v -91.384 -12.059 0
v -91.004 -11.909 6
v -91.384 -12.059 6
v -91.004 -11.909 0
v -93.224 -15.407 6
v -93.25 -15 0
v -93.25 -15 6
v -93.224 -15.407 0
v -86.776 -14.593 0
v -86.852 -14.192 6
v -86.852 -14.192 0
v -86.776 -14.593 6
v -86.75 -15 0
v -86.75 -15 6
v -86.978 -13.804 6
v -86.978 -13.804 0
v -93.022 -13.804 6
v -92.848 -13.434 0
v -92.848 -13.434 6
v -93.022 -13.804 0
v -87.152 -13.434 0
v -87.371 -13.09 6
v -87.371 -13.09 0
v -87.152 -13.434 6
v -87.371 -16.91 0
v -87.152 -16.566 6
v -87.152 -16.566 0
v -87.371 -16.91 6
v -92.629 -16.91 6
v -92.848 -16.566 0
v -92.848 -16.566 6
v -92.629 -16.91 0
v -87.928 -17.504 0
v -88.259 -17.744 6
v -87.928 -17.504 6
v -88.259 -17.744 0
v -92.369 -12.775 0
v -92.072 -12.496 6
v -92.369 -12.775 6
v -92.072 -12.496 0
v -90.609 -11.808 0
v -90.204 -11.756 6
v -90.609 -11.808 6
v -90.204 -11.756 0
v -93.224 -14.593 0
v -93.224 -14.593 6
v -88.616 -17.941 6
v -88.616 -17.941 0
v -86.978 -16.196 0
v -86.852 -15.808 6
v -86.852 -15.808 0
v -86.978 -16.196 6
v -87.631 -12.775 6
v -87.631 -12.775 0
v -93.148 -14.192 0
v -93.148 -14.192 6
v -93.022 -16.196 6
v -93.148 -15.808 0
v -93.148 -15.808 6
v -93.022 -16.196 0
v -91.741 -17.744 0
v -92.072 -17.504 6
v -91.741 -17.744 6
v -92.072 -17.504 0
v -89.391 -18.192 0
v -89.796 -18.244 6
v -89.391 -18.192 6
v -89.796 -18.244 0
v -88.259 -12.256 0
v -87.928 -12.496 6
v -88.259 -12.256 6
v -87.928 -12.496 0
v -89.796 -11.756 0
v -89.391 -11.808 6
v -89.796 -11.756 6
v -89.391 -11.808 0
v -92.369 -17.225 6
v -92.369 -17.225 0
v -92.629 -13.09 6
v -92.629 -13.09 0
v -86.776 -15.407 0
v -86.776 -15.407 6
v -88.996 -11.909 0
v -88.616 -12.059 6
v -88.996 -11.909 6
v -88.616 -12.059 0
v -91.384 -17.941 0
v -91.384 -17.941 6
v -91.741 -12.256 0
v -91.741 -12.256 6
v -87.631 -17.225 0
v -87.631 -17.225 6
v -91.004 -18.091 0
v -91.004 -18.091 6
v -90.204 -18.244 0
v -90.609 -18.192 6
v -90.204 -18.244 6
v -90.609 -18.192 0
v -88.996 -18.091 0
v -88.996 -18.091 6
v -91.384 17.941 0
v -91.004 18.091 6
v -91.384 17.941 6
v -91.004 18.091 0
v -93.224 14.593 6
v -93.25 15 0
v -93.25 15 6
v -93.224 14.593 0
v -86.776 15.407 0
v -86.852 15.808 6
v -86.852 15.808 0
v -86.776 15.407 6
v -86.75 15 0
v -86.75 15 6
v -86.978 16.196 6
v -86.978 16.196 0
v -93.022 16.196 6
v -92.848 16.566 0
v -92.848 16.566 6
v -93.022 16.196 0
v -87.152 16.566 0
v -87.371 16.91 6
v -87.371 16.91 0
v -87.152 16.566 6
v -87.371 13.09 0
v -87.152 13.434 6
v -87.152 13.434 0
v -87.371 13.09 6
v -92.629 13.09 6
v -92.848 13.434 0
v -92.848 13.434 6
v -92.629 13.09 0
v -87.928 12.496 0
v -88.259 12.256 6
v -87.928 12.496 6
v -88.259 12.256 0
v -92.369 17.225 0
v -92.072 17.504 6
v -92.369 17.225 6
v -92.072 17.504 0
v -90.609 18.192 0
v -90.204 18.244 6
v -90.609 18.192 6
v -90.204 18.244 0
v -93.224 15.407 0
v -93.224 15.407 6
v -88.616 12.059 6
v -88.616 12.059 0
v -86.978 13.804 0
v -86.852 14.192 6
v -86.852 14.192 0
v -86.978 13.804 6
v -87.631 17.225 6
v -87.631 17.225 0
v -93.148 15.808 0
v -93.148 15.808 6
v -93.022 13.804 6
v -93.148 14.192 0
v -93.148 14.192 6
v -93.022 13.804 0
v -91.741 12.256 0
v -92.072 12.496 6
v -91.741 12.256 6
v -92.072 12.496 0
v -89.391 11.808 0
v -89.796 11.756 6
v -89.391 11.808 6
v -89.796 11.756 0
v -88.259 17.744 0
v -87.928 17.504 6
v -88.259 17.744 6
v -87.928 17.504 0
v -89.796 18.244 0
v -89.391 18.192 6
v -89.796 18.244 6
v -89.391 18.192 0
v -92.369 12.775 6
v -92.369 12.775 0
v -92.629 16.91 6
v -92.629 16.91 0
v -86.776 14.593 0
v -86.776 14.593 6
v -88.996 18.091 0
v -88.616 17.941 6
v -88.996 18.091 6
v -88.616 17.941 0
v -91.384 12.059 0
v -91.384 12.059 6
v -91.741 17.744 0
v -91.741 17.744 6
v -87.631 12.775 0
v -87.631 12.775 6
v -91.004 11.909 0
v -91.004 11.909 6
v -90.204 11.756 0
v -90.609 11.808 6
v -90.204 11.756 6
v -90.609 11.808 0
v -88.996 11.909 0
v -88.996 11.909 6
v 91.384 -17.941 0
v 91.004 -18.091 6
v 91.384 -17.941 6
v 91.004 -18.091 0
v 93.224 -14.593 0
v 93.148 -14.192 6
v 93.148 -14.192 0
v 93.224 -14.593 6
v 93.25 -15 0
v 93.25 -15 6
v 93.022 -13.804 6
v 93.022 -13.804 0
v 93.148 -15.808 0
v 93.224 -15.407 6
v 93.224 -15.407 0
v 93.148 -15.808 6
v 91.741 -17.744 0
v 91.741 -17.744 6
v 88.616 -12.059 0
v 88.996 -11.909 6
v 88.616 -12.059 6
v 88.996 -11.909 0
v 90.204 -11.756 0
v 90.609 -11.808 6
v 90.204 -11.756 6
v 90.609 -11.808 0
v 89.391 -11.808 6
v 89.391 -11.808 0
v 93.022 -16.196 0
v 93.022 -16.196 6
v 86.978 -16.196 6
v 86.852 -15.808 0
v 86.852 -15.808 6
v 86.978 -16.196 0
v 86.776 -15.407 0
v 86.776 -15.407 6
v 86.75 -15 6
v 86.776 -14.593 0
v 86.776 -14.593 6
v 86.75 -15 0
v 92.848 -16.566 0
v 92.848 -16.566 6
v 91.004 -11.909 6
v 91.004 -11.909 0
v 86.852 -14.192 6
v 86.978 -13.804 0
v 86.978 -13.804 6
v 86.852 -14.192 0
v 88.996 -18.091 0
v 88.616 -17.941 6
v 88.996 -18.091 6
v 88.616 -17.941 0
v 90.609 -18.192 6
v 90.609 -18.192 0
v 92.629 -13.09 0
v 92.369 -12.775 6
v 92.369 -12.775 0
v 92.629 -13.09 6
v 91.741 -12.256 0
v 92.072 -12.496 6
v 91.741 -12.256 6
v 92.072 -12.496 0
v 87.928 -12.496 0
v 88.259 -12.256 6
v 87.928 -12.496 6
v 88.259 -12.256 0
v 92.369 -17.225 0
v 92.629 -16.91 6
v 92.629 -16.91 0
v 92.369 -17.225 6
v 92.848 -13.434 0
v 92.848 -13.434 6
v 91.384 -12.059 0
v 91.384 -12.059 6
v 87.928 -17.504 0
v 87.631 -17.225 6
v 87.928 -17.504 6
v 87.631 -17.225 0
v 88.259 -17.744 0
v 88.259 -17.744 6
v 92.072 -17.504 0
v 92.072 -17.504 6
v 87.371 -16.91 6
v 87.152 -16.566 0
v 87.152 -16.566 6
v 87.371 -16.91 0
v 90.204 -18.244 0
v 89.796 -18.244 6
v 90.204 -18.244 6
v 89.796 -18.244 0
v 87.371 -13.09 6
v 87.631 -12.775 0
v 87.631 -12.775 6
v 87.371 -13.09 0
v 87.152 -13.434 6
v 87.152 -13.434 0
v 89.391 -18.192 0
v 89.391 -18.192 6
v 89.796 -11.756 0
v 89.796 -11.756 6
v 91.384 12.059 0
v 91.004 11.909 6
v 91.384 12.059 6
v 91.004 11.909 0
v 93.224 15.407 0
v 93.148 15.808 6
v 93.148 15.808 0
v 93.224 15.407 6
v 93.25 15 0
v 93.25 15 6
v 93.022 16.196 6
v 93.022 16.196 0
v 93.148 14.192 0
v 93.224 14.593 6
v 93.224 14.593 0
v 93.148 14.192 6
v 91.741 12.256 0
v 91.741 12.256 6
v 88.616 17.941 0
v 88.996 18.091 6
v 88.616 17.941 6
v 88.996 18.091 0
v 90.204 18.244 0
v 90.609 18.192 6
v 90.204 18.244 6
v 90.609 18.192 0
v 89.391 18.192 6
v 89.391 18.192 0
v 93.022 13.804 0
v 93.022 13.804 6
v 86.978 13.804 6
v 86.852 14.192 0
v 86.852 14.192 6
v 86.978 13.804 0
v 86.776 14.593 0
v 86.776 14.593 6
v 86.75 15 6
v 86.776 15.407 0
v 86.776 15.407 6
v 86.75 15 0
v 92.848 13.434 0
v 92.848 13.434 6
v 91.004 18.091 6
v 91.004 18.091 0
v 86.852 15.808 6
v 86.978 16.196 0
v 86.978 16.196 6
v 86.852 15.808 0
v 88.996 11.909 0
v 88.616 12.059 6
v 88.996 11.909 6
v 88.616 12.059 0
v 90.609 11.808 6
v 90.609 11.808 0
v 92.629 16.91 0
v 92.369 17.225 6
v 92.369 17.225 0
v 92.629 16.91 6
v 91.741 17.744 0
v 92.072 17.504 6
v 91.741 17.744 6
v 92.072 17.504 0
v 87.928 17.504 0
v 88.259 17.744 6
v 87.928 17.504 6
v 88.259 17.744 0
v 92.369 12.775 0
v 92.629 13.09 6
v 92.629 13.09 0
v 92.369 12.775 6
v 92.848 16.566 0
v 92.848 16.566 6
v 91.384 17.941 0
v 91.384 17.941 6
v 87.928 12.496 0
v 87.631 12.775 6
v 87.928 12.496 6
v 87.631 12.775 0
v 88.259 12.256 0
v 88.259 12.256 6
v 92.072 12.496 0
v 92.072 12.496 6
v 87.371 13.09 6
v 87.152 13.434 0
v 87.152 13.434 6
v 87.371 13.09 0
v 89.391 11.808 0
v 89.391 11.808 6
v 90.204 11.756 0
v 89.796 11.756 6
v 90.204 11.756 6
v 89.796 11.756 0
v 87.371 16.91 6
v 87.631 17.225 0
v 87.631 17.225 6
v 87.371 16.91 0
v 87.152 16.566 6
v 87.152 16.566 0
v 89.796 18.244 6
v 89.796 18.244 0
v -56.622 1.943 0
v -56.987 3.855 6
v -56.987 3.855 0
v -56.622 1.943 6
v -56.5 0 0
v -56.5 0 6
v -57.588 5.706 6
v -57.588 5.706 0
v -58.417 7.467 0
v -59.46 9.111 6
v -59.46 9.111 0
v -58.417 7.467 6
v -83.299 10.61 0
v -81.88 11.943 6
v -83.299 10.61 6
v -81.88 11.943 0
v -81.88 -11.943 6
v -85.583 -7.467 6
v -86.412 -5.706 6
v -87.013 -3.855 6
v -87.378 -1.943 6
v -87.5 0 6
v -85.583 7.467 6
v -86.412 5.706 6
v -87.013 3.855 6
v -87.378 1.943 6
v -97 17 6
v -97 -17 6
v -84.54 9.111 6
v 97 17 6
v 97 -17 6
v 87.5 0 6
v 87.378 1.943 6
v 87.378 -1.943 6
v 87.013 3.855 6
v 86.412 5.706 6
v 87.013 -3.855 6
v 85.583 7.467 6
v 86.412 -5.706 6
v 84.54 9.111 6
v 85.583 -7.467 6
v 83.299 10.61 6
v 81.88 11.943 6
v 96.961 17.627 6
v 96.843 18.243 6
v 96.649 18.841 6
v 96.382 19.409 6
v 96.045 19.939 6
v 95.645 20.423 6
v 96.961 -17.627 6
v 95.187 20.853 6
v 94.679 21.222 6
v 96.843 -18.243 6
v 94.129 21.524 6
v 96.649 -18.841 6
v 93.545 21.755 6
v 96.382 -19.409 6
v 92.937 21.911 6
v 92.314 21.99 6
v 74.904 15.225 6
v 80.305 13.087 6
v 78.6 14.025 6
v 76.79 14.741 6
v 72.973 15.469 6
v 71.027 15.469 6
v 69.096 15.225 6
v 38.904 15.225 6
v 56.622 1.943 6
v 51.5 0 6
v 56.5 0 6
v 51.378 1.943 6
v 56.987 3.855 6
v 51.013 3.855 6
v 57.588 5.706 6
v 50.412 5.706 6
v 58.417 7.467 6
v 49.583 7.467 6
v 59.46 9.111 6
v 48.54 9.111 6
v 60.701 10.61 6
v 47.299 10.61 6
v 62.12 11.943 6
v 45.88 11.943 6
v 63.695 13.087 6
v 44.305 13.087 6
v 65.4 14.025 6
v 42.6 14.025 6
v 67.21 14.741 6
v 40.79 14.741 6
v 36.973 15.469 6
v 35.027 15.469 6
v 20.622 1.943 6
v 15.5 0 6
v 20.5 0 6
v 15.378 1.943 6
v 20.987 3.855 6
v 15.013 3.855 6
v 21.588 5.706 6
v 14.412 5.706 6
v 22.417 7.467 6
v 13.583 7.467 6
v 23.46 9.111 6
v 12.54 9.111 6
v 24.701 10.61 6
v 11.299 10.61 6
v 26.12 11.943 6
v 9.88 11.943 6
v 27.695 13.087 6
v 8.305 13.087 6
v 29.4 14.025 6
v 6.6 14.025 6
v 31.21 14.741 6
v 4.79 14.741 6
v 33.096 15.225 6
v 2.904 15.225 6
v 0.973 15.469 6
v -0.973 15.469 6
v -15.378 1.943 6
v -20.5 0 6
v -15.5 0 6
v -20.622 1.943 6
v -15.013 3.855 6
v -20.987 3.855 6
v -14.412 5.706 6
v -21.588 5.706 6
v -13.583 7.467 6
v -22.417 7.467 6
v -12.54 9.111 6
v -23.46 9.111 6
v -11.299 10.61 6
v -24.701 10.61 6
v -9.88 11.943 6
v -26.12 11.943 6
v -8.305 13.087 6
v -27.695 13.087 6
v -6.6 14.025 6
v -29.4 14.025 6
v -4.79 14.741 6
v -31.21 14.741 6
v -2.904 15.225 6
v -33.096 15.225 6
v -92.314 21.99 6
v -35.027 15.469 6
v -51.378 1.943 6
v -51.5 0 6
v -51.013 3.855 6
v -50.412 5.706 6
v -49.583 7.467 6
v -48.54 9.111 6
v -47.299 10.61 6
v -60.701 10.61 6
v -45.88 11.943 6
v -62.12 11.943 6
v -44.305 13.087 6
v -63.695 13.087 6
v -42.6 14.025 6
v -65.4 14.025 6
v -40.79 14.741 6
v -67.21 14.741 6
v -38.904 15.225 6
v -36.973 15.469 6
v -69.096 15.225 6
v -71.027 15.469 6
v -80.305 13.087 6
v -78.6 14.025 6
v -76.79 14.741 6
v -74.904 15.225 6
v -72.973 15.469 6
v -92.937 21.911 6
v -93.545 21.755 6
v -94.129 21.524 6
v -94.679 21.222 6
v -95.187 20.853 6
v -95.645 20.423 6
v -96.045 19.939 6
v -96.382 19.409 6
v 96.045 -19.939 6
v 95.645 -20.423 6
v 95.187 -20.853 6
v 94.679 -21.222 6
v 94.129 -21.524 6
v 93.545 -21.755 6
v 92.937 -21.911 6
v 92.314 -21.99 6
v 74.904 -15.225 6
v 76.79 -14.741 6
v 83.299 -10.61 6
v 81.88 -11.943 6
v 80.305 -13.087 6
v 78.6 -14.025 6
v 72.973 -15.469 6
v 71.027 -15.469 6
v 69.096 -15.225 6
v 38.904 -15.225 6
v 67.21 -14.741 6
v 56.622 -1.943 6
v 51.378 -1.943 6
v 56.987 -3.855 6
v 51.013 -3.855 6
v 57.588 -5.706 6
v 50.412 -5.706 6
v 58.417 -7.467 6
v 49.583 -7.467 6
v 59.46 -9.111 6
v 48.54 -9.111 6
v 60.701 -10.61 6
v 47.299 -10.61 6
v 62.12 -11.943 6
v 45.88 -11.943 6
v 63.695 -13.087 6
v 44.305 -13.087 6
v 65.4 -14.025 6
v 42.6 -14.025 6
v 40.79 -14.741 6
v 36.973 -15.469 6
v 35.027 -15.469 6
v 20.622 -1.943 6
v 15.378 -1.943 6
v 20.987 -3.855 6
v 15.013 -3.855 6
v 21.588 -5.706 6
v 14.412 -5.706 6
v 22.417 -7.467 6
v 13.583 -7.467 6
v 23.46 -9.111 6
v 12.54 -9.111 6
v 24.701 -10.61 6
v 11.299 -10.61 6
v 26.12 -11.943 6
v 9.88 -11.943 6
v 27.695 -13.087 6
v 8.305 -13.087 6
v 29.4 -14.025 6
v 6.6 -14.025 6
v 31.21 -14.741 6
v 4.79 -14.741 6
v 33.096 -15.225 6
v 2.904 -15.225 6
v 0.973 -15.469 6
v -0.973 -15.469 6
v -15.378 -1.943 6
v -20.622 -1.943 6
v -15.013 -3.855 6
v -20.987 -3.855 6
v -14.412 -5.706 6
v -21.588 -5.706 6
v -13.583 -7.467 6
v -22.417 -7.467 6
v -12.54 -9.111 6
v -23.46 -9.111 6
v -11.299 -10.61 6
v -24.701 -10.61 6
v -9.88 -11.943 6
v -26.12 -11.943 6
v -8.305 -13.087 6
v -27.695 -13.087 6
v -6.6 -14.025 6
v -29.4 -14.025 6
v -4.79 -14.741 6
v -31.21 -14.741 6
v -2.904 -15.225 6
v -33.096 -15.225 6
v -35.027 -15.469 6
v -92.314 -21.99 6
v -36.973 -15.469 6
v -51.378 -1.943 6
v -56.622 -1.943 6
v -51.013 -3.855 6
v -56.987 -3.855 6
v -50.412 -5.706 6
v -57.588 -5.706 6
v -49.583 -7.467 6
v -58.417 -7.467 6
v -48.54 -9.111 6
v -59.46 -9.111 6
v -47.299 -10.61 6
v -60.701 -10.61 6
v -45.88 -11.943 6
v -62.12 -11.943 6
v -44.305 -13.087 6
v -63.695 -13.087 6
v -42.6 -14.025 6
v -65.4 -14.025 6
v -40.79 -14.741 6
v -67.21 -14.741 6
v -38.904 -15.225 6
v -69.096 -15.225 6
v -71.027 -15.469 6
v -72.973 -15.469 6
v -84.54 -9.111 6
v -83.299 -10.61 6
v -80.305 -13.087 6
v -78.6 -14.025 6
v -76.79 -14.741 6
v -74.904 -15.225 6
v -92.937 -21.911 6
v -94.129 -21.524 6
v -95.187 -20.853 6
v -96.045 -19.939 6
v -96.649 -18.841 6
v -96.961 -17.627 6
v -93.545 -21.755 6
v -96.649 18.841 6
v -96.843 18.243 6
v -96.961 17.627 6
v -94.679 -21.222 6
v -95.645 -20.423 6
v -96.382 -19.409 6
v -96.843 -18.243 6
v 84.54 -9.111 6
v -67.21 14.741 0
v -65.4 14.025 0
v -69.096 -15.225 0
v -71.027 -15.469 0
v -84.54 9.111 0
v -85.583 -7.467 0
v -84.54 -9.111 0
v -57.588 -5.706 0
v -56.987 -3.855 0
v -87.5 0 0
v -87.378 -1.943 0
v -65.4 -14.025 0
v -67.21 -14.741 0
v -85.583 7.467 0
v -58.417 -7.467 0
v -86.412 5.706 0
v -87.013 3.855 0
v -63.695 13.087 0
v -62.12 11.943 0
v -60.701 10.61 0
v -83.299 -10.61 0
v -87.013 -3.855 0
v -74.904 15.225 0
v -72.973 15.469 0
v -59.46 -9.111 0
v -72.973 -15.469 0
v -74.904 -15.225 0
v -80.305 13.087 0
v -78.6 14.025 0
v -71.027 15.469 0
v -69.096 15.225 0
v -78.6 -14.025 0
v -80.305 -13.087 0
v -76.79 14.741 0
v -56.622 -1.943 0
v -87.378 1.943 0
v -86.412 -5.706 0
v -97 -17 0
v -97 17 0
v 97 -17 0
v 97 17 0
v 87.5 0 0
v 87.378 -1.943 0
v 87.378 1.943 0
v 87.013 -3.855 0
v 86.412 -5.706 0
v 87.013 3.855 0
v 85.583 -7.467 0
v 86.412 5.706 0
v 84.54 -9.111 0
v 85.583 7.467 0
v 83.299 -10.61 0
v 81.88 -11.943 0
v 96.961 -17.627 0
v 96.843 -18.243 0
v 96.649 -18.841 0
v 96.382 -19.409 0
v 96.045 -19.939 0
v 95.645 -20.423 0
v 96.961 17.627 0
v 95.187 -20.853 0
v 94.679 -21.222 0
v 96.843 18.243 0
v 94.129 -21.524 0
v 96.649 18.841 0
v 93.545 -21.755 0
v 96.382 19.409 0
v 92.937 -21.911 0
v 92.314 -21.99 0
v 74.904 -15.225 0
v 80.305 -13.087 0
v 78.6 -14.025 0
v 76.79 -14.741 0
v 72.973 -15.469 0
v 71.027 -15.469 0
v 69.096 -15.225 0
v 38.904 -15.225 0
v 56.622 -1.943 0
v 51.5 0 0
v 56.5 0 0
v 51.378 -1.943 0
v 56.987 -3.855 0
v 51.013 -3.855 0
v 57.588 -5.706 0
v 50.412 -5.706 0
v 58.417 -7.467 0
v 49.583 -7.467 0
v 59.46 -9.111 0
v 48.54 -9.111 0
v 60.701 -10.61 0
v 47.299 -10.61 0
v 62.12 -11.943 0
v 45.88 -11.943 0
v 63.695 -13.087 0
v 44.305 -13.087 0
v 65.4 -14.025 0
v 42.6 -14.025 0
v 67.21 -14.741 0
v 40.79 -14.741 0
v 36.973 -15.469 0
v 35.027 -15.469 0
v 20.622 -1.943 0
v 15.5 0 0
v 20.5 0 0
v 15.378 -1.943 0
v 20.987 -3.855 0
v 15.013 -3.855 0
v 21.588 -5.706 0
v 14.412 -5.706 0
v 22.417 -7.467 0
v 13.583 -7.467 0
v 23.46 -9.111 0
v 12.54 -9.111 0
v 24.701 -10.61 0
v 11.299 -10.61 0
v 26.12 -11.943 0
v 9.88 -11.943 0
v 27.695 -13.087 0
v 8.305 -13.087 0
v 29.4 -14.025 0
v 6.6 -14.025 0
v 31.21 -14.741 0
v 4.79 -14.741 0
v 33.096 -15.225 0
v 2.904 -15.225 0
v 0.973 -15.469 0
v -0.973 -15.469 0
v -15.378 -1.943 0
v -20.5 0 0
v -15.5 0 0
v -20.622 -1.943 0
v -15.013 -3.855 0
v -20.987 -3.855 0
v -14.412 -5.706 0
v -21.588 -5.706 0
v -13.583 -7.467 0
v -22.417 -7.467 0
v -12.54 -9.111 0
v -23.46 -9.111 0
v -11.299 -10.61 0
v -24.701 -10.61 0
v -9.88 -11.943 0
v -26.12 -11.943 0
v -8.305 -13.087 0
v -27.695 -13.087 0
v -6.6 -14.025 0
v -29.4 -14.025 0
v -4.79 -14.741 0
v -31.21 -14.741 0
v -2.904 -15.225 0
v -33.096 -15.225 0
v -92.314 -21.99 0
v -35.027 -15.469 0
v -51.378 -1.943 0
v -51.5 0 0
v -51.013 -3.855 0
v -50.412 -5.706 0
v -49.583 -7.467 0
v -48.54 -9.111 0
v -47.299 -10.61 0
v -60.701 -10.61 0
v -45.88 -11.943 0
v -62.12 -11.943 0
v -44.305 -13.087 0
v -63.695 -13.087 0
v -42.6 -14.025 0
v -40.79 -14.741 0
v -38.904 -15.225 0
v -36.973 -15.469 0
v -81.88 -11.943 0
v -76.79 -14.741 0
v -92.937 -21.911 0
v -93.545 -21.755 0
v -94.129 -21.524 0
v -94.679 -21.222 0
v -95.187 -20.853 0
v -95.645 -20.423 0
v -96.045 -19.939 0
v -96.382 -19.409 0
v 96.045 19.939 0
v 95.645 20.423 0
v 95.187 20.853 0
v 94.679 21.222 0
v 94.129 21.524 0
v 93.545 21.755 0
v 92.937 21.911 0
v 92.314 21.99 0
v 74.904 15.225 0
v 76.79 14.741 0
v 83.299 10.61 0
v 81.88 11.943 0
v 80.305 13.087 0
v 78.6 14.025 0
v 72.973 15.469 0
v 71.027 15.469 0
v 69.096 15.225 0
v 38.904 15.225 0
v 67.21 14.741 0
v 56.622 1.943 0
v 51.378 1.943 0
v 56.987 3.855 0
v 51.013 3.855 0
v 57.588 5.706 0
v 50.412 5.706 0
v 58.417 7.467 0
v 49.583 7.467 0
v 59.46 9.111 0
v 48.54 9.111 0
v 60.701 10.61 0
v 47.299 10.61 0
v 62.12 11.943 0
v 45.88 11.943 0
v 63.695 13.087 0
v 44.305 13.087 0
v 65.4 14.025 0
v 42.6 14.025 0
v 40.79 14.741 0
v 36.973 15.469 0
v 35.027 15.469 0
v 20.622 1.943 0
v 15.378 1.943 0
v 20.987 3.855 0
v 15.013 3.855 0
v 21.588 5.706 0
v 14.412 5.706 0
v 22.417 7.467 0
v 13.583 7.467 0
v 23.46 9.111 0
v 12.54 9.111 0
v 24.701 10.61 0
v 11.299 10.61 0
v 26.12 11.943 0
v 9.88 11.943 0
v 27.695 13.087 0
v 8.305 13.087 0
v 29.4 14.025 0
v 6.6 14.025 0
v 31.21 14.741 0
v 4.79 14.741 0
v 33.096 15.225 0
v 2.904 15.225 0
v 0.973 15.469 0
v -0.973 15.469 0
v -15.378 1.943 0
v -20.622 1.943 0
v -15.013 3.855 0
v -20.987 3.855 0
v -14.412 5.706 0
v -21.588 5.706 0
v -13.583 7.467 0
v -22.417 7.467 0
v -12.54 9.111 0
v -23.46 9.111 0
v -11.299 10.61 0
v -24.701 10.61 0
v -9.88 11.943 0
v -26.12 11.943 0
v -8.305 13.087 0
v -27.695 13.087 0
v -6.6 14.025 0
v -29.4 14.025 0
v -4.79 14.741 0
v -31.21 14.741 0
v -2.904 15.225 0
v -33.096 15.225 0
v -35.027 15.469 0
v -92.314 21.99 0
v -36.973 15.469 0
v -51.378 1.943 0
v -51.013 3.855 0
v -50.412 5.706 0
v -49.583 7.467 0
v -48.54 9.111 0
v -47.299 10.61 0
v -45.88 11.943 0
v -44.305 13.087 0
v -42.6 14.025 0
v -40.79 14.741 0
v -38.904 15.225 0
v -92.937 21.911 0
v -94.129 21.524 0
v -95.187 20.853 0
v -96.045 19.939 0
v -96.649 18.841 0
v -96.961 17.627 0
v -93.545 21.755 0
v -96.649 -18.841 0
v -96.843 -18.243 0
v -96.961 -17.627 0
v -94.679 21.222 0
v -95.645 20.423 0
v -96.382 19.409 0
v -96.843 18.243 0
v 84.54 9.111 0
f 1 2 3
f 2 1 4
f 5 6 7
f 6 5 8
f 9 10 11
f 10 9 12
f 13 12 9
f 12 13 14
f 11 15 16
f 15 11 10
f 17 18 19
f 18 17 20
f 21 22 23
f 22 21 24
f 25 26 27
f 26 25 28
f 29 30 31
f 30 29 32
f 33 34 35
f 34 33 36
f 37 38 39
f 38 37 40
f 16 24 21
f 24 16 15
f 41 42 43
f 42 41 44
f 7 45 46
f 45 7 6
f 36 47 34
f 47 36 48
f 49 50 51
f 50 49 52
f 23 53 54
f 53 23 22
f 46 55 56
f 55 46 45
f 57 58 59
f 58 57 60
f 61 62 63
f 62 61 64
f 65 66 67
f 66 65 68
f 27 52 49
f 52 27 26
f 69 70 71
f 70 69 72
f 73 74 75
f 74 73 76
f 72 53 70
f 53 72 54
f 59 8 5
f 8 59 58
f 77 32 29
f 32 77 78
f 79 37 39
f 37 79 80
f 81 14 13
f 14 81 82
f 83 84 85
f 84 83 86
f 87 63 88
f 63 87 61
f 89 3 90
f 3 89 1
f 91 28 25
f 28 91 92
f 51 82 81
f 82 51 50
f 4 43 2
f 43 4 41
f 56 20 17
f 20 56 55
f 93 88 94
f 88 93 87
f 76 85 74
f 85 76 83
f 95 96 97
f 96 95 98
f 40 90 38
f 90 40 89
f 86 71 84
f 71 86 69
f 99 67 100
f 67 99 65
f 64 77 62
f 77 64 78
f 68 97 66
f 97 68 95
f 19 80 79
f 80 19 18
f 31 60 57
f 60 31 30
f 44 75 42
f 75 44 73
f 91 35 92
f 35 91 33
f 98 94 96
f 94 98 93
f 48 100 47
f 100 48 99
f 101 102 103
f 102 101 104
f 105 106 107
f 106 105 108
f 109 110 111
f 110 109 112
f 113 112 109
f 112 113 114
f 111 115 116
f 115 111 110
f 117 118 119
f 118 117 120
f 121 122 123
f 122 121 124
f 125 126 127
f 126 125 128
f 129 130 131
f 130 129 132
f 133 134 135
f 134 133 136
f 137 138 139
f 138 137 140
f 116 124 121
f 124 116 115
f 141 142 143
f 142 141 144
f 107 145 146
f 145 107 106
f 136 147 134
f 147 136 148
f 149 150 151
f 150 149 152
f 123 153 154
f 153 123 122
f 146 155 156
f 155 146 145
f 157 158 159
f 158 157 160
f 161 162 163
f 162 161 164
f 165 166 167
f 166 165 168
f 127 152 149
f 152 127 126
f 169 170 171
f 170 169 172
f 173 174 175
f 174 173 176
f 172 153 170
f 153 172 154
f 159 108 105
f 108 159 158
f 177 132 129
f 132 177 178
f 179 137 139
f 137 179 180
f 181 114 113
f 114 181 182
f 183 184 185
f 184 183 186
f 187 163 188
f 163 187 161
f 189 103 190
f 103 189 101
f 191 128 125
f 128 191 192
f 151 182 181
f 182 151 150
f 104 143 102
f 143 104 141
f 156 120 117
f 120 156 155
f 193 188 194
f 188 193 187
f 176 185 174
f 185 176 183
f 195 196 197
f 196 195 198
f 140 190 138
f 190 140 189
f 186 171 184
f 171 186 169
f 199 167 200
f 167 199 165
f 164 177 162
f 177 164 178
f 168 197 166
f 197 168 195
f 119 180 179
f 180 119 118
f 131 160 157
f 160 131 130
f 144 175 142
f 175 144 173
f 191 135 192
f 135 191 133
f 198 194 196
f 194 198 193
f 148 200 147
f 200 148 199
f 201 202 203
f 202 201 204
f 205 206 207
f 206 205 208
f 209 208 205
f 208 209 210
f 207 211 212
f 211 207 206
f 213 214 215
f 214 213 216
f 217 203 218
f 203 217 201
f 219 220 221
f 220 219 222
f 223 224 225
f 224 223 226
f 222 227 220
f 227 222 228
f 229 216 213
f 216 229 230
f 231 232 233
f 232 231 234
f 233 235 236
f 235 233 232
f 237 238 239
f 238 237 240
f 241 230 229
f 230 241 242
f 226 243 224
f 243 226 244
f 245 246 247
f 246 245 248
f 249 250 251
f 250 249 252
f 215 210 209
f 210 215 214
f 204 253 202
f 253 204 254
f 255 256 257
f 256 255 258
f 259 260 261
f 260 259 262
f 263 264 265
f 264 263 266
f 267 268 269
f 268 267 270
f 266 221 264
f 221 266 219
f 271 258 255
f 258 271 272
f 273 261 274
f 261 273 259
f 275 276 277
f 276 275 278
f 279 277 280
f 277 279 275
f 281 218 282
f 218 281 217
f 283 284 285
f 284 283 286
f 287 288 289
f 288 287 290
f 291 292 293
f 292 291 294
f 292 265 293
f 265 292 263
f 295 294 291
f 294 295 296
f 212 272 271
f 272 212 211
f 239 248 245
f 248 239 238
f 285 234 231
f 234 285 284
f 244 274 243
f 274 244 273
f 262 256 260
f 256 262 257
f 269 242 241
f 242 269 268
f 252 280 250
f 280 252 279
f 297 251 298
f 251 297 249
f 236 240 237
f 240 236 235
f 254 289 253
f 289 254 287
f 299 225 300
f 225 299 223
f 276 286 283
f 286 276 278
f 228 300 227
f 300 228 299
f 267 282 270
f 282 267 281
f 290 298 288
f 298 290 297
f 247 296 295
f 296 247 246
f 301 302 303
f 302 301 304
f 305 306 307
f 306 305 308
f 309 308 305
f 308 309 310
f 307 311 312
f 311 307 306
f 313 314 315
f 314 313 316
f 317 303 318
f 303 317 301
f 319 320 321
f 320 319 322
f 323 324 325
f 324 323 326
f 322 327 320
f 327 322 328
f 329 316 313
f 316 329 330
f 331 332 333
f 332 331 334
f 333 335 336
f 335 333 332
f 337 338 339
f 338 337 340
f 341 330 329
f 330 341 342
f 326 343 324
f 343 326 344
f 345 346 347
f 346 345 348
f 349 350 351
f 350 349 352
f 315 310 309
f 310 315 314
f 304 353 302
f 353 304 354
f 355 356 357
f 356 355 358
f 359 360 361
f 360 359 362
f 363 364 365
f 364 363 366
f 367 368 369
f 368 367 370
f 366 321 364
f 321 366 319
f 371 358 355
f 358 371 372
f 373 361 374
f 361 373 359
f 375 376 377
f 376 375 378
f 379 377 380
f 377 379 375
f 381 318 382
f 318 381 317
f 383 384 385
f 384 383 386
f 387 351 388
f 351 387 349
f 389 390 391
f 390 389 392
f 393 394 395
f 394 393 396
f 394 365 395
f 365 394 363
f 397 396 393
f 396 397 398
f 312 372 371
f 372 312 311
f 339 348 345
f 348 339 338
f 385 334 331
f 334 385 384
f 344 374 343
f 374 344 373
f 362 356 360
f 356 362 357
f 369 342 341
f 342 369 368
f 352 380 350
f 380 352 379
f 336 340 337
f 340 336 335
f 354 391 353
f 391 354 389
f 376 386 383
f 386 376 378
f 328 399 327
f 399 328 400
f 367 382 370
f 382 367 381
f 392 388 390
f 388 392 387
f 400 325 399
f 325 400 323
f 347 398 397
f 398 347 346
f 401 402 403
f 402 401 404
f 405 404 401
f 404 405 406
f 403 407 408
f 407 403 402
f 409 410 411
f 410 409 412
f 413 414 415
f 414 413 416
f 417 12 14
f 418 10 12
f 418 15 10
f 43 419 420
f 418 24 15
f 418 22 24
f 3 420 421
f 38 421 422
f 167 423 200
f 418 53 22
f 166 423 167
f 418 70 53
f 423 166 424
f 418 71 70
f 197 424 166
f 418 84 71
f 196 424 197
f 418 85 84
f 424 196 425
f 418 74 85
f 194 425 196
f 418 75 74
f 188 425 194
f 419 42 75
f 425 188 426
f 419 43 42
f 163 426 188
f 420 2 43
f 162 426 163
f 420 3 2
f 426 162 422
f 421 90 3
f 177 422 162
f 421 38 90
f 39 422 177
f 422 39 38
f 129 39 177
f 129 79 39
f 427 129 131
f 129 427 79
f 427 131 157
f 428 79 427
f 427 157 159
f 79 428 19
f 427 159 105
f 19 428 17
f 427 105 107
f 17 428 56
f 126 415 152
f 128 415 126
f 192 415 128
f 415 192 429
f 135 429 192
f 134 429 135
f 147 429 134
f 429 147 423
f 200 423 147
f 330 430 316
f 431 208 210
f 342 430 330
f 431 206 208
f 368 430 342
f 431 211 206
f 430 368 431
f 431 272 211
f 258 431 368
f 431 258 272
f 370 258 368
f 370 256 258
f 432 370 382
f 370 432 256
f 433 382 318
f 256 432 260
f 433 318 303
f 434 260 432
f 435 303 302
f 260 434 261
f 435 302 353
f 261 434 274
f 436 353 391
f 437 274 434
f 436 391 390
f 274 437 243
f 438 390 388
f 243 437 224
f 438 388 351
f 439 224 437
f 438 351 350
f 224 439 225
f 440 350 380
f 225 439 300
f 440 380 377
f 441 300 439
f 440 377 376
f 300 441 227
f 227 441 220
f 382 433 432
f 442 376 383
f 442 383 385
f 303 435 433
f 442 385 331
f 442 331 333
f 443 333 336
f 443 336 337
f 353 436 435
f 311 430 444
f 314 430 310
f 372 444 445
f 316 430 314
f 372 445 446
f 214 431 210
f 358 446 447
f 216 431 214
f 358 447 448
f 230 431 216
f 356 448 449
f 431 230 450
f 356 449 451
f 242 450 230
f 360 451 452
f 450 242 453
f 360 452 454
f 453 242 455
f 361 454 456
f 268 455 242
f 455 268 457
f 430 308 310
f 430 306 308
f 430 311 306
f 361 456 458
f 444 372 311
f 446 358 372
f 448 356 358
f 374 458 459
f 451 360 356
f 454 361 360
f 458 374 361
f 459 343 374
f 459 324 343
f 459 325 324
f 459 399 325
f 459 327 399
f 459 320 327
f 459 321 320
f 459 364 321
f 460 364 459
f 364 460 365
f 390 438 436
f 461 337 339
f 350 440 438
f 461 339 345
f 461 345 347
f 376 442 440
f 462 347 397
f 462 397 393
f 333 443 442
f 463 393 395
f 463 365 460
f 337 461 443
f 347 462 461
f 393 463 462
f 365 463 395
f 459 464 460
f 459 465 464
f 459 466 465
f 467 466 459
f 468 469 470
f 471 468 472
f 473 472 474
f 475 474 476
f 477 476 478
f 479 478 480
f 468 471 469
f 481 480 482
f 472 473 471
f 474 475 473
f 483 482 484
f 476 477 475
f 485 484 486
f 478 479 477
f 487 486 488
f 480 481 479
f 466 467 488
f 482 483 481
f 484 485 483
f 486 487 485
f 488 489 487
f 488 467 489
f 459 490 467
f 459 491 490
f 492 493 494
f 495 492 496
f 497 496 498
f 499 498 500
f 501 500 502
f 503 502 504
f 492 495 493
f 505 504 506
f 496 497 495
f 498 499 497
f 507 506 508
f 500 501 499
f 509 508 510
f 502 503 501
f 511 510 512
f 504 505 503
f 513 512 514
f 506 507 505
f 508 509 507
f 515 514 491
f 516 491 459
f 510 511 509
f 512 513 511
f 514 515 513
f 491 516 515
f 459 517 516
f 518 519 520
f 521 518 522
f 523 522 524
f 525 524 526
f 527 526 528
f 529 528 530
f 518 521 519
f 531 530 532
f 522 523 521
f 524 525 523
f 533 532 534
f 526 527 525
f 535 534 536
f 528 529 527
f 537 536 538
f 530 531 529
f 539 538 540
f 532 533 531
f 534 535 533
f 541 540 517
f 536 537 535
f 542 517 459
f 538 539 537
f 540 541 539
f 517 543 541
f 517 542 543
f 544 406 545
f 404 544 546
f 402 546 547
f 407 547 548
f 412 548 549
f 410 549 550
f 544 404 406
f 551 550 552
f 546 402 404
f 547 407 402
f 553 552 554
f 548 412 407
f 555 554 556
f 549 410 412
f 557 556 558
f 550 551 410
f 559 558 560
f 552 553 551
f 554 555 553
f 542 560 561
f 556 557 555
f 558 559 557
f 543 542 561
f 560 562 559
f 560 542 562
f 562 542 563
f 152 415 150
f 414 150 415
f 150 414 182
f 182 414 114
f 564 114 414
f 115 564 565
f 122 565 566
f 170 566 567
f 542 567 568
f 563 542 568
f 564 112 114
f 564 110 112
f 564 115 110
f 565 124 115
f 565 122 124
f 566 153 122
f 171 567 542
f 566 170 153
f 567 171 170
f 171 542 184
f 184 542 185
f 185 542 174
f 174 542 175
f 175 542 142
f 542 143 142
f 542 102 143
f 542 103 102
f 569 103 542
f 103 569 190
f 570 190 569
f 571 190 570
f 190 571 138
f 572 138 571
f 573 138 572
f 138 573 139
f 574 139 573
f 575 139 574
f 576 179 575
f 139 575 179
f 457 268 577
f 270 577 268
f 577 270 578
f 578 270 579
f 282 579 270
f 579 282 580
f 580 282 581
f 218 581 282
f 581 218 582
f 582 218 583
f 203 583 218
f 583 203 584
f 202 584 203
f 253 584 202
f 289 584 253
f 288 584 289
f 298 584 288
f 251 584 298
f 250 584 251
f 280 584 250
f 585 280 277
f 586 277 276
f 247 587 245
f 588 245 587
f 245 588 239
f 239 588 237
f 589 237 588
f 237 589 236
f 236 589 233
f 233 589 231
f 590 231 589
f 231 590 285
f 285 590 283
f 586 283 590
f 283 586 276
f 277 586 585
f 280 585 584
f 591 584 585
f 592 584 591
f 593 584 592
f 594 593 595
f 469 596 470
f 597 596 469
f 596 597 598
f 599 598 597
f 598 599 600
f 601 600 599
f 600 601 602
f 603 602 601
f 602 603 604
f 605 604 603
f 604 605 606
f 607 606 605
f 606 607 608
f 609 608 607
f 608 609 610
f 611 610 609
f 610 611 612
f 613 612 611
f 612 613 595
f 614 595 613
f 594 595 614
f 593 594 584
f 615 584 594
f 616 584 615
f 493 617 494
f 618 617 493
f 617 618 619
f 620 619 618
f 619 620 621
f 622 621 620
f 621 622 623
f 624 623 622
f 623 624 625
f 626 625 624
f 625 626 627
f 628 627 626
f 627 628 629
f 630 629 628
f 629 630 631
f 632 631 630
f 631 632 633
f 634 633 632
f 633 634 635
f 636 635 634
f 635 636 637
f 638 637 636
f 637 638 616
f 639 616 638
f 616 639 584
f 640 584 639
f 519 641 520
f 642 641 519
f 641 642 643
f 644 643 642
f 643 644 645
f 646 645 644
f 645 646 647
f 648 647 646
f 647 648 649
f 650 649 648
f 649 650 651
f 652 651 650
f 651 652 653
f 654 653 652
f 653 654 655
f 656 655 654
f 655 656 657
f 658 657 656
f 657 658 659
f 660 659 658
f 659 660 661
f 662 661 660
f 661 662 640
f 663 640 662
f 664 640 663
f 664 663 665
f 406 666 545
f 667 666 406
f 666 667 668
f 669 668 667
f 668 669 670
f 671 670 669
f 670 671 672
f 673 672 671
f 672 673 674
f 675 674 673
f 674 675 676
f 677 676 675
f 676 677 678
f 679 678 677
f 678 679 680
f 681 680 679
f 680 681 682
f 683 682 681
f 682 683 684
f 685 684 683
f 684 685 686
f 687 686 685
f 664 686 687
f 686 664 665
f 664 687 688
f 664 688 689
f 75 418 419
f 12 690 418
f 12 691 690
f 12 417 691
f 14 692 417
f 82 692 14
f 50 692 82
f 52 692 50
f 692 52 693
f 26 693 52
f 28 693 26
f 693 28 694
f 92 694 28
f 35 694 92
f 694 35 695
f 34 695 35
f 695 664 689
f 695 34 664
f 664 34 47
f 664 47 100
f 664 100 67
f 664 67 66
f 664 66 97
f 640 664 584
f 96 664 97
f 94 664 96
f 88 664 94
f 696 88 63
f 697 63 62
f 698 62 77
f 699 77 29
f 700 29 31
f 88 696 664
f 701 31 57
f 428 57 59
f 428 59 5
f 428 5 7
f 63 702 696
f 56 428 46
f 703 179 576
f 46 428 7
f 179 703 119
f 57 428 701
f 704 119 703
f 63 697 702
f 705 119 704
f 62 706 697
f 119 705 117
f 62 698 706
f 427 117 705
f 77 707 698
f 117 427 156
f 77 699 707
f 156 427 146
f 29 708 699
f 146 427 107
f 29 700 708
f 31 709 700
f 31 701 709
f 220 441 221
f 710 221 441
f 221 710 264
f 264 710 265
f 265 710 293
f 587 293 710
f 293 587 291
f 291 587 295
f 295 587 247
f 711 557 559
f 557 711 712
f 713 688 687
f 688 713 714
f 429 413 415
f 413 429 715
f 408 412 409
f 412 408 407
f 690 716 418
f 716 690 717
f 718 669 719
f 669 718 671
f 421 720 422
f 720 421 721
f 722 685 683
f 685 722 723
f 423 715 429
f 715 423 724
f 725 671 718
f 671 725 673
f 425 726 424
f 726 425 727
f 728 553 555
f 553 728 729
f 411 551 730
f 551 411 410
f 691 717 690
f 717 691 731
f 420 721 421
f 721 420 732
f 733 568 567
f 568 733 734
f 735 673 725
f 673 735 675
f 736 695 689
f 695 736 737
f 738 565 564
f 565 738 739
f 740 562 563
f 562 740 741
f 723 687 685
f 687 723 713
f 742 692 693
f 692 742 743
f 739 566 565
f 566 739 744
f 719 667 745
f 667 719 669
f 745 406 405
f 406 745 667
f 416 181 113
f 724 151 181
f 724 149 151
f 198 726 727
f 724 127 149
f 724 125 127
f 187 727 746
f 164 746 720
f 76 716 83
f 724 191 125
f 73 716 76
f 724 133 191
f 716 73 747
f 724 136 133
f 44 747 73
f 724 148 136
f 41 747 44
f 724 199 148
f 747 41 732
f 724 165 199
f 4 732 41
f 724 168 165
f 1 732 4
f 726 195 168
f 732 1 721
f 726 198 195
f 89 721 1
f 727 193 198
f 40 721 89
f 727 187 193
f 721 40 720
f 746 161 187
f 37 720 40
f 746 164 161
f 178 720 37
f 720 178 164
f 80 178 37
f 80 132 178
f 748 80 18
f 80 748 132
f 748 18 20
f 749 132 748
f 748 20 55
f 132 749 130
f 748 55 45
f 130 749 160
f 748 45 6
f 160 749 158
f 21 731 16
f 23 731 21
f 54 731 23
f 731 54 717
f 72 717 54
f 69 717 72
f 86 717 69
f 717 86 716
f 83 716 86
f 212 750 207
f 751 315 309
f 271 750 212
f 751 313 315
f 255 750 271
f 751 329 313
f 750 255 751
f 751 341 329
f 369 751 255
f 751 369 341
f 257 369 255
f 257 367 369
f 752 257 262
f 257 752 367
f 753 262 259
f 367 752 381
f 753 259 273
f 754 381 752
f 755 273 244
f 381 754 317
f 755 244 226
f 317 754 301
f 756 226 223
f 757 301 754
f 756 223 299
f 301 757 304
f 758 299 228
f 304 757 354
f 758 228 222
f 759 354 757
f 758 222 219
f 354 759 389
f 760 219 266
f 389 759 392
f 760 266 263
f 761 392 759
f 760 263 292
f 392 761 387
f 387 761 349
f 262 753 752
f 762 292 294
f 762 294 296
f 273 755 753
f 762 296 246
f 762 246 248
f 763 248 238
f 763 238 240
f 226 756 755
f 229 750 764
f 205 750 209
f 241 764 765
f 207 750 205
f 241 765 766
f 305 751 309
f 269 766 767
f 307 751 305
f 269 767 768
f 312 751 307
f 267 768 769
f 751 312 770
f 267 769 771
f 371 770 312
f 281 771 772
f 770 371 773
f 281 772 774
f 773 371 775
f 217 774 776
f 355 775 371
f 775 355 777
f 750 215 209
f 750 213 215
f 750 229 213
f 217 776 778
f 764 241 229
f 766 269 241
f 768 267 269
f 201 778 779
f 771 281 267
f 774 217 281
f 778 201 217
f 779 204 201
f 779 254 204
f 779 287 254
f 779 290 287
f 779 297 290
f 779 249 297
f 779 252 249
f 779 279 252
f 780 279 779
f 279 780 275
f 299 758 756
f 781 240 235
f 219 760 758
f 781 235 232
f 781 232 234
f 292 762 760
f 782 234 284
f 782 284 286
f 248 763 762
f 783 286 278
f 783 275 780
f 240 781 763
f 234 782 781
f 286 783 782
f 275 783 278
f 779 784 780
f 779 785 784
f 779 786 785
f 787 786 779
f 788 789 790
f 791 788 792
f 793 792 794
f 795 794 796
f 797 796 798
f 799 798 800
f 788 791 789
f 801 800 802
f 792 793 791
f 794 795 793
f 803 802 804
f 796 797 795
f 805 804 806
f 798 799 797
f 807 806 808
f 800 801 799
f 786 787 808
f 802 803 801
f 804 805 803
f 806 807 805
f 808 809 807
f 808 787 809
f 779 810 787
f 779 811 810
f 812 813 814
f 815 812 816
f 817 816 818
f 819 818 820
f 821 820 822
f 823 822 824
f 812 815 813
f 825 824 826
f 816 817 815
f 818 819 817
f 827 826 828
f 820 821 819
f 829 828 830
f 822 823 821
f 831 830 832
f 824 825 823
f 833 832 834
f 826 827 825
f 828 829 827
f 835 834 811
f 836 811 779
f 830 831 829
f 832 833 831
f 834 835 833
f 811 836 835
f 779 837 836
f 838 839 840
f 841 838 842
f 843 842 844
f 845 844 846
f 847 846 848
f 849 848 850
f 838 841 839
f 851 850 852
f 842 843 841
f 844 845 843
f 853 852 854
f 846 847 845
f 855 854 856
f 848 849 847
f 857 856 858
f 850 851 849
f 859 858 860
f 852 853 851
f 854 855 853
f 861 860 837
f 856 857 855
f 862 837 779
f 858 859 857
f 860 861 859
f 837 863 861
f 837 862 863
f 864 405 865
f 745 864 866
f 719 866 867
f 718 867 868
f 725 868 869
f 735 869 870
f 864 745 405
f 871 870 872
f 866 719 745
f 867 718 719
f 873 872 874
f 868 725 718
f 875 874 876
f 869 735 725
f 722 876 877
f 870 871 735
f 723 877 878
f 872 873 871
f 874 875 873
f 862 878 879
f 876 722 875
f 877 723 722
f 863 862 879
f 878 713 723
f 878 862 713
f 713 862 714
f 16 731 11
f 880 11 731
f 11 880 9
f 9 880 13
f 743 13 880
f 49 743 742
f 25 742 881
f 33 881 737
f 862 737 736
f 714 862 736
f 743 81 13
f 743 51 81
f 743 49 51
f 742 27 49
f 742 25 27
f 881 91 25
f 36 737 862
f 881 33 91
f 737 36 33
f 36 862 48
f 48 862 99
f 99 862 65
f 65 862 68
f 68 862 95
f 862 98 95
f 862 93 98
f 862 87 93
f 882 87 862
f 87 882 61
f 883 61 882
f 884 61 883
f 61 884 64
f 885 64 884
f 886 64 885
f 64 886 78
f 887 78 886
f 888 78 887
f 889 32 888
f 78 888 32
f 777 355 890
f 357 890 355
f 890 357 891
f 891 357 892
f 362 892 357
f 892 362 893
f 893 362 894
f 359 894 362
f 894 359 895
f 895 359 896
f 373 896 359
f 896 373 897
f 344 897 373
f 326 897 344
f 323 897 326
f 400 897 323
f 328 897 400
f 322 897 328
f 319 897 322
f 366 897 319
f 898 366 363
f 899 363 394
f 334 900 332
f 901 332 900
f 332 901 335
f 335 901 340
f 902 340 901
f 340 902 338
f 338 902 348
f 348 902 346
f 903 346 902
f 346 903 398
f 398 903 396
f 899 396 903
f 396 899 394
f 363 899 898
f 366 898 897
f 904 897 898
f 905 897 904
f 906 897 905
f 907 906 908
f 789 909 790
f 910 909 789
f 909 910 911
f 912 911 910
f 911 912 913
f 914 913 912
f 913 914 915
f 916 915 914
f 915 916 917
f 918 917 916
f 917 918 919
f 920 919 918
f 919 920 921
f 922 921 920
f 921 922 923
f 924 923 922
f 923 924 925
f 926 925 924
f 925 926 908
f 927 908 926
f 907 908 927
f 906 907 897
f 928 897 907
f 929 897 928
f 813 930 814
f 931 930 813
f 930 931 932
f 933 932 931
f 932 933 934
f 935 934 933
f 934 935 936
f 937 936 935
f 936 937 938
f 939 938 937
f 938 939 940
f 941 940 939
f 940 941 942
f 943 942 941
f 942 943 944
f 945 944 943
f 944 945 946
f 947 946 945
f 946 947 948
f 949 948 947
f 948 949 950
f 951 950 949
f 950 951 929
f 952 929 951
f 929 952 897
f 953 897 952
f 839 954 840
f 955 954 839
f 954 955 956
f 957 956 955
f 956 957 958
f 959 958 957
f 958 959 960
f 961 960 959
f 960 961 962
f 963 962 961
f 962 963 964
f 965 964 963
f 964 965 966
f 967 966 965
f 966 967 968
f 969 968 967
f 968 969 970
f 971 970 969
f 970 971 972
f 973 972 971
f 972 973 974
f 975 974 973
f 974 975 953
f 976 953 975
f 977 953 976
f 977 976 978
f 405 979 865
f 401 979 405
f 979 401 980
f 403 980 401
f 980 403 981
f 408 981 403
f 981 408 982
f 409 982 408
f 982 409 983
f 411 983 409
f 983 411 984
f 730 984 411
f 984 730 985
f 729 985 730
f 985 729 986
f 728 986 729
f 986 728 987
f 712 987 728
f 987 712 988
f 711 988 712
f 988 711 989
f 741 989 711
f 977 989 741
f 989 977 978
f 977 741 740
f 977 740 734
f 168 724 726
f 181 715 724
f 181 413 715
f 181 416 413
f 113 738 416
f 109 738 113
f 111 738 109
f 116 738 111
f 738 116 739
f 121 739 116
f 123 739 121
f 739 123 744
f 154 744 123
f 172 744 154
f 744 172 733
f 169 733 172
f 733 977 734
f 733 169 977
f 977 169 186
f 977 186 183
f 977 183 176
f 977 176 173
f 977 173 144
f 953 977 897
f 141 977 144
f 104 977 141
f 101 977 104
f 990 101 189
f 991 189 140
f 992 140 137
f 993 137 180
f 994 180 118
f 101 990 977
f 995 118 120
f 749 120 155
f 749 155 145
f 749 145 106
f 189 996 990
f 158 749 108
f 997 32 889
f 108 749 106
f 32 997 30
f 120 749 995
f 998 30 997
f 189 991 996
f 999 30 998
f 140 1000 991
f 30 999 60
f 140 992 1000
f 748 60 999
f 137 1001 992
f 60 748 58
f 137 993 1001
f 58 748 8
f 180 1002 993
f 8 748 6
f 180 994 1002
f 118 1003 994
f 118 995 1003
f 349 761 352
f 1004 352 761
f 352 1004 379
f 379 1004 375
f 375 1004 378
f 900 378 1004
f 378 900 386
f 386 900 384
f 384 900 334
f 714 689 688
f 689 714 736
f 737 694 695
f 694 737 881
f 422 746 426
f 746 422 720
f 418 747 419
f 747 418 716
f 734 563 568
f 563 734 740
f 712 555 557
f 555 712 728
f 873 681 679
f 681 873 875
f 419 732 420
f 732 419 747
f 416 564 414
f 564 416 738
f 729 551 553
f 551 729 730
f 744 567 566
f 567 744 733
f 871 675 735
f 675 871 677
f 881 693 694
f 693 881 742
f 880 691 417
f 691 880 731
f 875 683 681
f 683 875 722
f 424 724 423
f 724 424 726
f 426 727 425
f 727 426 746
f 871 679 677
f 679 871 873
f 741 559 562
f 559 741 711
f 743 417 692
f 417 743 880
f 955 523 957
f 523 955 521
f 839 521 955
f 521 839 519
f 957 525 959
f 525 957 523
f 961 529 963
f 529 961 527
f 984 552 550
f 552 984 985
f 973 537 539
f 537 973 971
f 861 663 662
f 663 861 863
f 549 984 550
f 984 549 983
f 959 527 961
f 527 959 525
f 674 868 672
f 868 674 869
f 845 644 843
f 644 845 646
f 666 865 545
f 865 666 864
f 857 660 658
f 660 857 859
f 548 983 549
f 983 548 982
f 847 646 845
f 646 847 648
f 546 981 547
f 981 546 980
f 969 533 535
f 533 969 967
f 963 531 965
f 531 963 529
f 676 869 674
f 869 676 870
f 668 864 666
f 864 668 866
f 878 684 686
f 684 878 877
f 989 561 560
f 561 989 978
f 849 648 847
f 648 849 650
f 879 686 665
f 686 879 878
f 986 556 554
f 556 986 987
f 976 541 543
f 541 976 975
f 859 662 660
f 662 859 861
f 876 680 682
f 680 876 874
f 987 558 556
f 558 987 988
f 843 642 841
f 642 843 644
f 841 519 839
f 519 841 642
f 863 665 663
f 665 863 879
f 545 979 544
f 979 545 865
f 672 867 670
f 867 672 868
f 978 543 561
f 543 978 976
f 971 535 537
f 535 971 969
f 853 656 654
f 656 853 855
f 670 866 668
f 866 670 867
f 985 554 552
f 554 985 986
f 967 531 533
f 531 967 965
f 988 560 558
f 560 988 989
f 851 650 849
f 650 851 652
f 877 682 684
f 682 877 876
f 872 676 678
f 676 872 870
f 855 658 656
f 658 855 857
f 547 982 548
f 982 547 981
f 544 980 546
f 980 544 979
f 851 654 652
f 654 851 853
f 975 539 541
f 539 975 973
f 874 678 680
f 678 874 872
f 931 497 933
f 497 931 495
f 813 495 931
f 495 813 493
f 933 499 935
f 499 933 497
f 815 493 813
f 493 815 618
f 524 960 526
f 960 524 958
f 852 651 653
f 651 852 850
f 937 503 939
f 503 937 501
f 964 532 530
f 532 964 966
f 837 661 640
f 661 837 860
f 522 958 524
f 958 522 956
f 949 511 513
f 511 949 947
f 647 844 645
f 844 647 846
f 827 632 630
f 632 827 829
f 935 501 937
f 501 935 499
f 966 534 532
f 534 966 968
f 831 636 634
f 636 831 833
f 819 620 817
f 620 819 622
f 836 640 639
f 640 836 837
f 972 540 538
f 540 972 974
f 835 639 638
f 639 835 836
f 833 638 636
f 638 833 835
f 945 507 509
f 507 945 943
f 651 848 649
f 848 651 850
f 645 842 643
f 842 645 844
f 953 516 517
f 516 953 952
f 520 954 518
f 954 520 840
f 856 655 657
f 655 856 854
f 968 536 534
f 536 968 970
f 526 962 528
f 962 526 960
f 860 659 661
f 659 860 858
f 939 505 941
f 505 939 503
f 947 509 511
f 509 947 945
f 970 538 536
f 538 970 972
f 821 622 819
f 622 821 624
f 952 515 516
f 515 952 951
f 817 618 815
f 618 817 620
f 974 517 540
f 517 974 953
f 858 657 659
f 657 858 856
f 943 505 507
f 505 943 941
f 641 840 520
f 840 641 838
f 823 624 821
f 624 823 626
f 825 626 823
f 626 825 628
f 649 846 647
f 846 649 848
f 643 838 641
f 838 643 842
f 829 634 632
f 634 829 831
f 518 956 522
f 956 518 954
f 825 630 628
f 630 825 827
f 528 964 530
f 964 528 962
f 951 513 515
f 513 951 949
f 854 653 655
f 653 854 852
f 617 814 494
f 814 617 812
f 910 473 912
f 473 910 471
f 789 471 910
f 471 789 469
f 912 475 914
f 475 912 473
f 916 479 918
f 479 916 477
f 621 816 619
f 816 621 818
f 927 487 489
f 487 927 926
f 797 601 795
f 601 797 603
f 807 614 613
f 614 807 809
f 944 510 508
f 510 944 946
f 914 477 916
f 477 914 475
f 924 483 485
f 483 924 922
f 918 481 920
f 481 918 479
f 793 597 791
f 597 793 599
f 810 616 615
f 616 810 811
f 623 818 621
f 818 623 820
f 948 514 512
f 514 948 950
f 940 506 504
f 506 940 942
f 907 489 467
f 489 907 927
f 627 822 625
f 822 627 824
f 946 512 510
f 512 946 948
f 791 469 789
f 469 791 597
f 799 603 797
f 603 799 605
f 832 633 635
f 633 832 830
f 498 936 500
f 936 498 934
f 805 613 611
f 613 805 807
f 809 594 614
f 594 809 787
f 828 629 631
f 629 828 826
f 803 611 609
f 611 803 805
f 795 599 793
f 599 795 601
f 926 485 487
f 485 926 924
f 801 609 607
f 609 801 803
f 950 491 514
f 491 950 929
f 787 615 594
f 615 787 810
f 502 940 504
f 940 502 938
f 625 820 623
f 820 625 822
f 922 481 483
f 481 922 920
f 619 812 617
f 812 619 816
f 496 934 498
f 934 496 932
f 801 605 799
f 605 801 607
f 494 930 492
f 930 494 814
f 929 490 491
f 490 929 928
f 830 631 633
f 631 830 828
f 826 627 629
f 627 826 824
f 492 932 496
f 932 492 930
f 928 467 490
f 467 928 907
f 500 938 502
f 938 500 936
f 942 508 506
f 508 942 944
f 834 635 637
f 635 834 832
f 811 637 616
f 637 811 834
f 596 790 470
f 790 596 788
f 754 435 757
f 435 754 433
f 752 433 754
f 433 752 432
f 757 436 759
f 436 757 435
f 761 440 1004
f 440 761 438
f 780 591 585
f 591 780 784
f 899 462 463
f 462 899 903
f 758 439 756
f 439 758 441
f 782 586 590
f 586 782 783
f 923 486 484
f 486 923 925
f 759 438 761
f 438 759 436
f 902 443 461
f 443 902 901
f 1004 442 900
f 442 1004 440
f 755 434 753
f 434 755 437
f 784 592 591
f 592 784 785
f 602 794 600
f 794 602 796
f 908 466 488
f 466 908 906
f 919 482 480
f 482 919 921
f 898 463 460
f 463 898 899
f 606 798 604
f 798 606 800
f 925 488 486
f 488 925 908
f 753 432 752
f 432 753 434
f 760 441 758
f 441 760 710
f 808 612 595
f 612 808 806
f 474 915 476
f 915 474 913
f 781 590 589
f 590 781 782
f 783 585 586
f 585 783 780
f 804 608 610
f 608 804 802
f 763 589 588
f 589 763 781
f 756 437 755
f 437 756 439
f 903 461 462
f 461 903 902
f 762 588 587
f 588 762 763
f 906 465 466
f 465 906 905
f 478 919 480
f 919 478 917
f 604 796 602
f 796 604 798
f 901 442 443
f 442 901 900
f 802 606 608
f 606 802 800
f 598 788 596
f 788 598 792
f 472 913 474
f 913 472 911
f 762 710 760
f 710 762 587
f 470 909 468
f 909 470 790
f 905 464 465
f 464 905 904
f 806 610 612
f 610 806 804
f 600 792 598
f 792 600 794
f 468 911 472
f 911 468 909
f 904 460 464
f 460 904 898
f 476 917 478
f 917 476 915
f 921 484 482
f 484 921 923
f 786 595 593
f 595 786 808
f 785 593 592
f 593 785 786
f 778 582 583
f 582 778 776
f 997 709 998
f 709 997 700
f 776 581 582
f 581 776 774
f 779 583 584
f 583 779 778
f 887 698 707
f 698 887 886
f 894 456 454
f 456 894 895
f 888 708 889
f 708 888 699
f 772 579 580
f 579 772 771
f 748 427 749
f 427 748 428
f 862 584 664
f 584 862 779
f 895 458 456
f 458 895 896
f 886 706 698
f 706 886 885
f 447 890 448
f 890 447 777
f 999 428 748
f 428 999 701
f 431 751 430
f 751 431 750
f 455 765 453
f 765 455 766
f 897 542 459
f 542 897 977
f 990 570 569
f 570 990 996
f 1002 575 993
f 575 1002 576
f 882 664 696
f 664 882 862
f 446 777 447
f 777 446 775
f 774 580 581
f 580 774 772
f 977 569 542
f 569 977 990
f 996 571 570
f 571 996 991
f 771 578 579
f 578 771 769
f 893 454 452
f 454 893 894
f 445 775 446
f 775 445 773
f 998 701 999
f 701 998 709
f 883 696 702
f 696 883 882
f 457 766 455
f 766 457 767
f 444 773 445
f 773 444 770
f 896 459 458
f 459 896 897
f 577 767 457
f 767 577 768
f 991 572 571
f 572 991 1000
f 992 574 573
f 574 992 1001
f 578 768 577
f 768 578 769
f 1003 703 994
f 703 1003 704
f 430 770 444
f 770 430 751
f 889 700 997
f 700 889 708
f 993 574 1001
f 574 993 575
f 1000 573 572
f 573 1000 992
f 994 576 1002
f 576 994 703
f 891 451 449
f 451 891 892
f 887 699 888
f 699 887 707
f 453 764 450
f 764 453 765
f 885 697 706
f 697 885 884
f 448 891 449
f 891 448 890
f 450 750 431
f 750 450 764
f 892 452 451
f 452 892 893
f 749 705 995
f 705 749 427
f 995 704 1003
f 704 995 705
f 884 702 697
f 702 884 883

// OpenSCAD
$fn = 50;

difference() {
	union() {
		hull() {
			translate(v = [-92.0, 17.0, 0]) {
				cylinder(h = 6, r = 5);
			}
			translate(v = [92.0, 17.0, 0]) {
				cylinder(h = 6, r = 5);
			}
			translate(v = [-92.0, -17.0, 0]) {
				cylinder(h = 6, r = 5);
			}
			translate(v = [92.0, -17.0, 0]) {
				cylinder(h = 6, r = 5);
			}
		}
	}
	union() {
		translate(v = [-90.0, -15.0, -100.0]) {
			cylinder(h = 200, r = 3.25);
		}
		translate(v = [-90.0, 15.0, -100.0]) {
			cylinder(h = 200, r = 3.25);
		}
		translate(v = [90.0, -15.0, -100.0]) {
			cylinder(h = 200, r = 3.25);
		}
		translate(v = [90.0, 15.0, -100.0]) {
			cylinder(h = 200, r = 3.25);
		}
		translate(v = [-90.0, -15.0, -100.0]) {
			cylinder(h = 200, r = 1.8);
		}
		translate(v = [-90.0, 15.0, -100.0]) {
			cylinder(h = 200, r = 1.8);
		}
		translate(v = [90.0, -15.0, -100.0]) {
			cylinder(h = 200, r = 1.8);
		}
		translate(v = [90.0, 15.0, -100.0]) {
			cylinder(h = 200, r = 1.8);
		}
		translate(v = [-72.0, 0, 0.0]) {
			cylinder(h = 6, r = 15.5);
		}
		translate(v = [-36.0, 0, 0.0]) {
			cylinder(h = 6, r = 15.5);
		}
		cylinder(h = 6, r = 15.5);
		translate(v = [36.0, 0, 0.0]) {
			cylinder(h = 6, r = 15.5);
		}
		translate(v = [72.0, 0, 0.0]) {
			cylinder(h = 6, r = 15.5);
		}
	}
}
